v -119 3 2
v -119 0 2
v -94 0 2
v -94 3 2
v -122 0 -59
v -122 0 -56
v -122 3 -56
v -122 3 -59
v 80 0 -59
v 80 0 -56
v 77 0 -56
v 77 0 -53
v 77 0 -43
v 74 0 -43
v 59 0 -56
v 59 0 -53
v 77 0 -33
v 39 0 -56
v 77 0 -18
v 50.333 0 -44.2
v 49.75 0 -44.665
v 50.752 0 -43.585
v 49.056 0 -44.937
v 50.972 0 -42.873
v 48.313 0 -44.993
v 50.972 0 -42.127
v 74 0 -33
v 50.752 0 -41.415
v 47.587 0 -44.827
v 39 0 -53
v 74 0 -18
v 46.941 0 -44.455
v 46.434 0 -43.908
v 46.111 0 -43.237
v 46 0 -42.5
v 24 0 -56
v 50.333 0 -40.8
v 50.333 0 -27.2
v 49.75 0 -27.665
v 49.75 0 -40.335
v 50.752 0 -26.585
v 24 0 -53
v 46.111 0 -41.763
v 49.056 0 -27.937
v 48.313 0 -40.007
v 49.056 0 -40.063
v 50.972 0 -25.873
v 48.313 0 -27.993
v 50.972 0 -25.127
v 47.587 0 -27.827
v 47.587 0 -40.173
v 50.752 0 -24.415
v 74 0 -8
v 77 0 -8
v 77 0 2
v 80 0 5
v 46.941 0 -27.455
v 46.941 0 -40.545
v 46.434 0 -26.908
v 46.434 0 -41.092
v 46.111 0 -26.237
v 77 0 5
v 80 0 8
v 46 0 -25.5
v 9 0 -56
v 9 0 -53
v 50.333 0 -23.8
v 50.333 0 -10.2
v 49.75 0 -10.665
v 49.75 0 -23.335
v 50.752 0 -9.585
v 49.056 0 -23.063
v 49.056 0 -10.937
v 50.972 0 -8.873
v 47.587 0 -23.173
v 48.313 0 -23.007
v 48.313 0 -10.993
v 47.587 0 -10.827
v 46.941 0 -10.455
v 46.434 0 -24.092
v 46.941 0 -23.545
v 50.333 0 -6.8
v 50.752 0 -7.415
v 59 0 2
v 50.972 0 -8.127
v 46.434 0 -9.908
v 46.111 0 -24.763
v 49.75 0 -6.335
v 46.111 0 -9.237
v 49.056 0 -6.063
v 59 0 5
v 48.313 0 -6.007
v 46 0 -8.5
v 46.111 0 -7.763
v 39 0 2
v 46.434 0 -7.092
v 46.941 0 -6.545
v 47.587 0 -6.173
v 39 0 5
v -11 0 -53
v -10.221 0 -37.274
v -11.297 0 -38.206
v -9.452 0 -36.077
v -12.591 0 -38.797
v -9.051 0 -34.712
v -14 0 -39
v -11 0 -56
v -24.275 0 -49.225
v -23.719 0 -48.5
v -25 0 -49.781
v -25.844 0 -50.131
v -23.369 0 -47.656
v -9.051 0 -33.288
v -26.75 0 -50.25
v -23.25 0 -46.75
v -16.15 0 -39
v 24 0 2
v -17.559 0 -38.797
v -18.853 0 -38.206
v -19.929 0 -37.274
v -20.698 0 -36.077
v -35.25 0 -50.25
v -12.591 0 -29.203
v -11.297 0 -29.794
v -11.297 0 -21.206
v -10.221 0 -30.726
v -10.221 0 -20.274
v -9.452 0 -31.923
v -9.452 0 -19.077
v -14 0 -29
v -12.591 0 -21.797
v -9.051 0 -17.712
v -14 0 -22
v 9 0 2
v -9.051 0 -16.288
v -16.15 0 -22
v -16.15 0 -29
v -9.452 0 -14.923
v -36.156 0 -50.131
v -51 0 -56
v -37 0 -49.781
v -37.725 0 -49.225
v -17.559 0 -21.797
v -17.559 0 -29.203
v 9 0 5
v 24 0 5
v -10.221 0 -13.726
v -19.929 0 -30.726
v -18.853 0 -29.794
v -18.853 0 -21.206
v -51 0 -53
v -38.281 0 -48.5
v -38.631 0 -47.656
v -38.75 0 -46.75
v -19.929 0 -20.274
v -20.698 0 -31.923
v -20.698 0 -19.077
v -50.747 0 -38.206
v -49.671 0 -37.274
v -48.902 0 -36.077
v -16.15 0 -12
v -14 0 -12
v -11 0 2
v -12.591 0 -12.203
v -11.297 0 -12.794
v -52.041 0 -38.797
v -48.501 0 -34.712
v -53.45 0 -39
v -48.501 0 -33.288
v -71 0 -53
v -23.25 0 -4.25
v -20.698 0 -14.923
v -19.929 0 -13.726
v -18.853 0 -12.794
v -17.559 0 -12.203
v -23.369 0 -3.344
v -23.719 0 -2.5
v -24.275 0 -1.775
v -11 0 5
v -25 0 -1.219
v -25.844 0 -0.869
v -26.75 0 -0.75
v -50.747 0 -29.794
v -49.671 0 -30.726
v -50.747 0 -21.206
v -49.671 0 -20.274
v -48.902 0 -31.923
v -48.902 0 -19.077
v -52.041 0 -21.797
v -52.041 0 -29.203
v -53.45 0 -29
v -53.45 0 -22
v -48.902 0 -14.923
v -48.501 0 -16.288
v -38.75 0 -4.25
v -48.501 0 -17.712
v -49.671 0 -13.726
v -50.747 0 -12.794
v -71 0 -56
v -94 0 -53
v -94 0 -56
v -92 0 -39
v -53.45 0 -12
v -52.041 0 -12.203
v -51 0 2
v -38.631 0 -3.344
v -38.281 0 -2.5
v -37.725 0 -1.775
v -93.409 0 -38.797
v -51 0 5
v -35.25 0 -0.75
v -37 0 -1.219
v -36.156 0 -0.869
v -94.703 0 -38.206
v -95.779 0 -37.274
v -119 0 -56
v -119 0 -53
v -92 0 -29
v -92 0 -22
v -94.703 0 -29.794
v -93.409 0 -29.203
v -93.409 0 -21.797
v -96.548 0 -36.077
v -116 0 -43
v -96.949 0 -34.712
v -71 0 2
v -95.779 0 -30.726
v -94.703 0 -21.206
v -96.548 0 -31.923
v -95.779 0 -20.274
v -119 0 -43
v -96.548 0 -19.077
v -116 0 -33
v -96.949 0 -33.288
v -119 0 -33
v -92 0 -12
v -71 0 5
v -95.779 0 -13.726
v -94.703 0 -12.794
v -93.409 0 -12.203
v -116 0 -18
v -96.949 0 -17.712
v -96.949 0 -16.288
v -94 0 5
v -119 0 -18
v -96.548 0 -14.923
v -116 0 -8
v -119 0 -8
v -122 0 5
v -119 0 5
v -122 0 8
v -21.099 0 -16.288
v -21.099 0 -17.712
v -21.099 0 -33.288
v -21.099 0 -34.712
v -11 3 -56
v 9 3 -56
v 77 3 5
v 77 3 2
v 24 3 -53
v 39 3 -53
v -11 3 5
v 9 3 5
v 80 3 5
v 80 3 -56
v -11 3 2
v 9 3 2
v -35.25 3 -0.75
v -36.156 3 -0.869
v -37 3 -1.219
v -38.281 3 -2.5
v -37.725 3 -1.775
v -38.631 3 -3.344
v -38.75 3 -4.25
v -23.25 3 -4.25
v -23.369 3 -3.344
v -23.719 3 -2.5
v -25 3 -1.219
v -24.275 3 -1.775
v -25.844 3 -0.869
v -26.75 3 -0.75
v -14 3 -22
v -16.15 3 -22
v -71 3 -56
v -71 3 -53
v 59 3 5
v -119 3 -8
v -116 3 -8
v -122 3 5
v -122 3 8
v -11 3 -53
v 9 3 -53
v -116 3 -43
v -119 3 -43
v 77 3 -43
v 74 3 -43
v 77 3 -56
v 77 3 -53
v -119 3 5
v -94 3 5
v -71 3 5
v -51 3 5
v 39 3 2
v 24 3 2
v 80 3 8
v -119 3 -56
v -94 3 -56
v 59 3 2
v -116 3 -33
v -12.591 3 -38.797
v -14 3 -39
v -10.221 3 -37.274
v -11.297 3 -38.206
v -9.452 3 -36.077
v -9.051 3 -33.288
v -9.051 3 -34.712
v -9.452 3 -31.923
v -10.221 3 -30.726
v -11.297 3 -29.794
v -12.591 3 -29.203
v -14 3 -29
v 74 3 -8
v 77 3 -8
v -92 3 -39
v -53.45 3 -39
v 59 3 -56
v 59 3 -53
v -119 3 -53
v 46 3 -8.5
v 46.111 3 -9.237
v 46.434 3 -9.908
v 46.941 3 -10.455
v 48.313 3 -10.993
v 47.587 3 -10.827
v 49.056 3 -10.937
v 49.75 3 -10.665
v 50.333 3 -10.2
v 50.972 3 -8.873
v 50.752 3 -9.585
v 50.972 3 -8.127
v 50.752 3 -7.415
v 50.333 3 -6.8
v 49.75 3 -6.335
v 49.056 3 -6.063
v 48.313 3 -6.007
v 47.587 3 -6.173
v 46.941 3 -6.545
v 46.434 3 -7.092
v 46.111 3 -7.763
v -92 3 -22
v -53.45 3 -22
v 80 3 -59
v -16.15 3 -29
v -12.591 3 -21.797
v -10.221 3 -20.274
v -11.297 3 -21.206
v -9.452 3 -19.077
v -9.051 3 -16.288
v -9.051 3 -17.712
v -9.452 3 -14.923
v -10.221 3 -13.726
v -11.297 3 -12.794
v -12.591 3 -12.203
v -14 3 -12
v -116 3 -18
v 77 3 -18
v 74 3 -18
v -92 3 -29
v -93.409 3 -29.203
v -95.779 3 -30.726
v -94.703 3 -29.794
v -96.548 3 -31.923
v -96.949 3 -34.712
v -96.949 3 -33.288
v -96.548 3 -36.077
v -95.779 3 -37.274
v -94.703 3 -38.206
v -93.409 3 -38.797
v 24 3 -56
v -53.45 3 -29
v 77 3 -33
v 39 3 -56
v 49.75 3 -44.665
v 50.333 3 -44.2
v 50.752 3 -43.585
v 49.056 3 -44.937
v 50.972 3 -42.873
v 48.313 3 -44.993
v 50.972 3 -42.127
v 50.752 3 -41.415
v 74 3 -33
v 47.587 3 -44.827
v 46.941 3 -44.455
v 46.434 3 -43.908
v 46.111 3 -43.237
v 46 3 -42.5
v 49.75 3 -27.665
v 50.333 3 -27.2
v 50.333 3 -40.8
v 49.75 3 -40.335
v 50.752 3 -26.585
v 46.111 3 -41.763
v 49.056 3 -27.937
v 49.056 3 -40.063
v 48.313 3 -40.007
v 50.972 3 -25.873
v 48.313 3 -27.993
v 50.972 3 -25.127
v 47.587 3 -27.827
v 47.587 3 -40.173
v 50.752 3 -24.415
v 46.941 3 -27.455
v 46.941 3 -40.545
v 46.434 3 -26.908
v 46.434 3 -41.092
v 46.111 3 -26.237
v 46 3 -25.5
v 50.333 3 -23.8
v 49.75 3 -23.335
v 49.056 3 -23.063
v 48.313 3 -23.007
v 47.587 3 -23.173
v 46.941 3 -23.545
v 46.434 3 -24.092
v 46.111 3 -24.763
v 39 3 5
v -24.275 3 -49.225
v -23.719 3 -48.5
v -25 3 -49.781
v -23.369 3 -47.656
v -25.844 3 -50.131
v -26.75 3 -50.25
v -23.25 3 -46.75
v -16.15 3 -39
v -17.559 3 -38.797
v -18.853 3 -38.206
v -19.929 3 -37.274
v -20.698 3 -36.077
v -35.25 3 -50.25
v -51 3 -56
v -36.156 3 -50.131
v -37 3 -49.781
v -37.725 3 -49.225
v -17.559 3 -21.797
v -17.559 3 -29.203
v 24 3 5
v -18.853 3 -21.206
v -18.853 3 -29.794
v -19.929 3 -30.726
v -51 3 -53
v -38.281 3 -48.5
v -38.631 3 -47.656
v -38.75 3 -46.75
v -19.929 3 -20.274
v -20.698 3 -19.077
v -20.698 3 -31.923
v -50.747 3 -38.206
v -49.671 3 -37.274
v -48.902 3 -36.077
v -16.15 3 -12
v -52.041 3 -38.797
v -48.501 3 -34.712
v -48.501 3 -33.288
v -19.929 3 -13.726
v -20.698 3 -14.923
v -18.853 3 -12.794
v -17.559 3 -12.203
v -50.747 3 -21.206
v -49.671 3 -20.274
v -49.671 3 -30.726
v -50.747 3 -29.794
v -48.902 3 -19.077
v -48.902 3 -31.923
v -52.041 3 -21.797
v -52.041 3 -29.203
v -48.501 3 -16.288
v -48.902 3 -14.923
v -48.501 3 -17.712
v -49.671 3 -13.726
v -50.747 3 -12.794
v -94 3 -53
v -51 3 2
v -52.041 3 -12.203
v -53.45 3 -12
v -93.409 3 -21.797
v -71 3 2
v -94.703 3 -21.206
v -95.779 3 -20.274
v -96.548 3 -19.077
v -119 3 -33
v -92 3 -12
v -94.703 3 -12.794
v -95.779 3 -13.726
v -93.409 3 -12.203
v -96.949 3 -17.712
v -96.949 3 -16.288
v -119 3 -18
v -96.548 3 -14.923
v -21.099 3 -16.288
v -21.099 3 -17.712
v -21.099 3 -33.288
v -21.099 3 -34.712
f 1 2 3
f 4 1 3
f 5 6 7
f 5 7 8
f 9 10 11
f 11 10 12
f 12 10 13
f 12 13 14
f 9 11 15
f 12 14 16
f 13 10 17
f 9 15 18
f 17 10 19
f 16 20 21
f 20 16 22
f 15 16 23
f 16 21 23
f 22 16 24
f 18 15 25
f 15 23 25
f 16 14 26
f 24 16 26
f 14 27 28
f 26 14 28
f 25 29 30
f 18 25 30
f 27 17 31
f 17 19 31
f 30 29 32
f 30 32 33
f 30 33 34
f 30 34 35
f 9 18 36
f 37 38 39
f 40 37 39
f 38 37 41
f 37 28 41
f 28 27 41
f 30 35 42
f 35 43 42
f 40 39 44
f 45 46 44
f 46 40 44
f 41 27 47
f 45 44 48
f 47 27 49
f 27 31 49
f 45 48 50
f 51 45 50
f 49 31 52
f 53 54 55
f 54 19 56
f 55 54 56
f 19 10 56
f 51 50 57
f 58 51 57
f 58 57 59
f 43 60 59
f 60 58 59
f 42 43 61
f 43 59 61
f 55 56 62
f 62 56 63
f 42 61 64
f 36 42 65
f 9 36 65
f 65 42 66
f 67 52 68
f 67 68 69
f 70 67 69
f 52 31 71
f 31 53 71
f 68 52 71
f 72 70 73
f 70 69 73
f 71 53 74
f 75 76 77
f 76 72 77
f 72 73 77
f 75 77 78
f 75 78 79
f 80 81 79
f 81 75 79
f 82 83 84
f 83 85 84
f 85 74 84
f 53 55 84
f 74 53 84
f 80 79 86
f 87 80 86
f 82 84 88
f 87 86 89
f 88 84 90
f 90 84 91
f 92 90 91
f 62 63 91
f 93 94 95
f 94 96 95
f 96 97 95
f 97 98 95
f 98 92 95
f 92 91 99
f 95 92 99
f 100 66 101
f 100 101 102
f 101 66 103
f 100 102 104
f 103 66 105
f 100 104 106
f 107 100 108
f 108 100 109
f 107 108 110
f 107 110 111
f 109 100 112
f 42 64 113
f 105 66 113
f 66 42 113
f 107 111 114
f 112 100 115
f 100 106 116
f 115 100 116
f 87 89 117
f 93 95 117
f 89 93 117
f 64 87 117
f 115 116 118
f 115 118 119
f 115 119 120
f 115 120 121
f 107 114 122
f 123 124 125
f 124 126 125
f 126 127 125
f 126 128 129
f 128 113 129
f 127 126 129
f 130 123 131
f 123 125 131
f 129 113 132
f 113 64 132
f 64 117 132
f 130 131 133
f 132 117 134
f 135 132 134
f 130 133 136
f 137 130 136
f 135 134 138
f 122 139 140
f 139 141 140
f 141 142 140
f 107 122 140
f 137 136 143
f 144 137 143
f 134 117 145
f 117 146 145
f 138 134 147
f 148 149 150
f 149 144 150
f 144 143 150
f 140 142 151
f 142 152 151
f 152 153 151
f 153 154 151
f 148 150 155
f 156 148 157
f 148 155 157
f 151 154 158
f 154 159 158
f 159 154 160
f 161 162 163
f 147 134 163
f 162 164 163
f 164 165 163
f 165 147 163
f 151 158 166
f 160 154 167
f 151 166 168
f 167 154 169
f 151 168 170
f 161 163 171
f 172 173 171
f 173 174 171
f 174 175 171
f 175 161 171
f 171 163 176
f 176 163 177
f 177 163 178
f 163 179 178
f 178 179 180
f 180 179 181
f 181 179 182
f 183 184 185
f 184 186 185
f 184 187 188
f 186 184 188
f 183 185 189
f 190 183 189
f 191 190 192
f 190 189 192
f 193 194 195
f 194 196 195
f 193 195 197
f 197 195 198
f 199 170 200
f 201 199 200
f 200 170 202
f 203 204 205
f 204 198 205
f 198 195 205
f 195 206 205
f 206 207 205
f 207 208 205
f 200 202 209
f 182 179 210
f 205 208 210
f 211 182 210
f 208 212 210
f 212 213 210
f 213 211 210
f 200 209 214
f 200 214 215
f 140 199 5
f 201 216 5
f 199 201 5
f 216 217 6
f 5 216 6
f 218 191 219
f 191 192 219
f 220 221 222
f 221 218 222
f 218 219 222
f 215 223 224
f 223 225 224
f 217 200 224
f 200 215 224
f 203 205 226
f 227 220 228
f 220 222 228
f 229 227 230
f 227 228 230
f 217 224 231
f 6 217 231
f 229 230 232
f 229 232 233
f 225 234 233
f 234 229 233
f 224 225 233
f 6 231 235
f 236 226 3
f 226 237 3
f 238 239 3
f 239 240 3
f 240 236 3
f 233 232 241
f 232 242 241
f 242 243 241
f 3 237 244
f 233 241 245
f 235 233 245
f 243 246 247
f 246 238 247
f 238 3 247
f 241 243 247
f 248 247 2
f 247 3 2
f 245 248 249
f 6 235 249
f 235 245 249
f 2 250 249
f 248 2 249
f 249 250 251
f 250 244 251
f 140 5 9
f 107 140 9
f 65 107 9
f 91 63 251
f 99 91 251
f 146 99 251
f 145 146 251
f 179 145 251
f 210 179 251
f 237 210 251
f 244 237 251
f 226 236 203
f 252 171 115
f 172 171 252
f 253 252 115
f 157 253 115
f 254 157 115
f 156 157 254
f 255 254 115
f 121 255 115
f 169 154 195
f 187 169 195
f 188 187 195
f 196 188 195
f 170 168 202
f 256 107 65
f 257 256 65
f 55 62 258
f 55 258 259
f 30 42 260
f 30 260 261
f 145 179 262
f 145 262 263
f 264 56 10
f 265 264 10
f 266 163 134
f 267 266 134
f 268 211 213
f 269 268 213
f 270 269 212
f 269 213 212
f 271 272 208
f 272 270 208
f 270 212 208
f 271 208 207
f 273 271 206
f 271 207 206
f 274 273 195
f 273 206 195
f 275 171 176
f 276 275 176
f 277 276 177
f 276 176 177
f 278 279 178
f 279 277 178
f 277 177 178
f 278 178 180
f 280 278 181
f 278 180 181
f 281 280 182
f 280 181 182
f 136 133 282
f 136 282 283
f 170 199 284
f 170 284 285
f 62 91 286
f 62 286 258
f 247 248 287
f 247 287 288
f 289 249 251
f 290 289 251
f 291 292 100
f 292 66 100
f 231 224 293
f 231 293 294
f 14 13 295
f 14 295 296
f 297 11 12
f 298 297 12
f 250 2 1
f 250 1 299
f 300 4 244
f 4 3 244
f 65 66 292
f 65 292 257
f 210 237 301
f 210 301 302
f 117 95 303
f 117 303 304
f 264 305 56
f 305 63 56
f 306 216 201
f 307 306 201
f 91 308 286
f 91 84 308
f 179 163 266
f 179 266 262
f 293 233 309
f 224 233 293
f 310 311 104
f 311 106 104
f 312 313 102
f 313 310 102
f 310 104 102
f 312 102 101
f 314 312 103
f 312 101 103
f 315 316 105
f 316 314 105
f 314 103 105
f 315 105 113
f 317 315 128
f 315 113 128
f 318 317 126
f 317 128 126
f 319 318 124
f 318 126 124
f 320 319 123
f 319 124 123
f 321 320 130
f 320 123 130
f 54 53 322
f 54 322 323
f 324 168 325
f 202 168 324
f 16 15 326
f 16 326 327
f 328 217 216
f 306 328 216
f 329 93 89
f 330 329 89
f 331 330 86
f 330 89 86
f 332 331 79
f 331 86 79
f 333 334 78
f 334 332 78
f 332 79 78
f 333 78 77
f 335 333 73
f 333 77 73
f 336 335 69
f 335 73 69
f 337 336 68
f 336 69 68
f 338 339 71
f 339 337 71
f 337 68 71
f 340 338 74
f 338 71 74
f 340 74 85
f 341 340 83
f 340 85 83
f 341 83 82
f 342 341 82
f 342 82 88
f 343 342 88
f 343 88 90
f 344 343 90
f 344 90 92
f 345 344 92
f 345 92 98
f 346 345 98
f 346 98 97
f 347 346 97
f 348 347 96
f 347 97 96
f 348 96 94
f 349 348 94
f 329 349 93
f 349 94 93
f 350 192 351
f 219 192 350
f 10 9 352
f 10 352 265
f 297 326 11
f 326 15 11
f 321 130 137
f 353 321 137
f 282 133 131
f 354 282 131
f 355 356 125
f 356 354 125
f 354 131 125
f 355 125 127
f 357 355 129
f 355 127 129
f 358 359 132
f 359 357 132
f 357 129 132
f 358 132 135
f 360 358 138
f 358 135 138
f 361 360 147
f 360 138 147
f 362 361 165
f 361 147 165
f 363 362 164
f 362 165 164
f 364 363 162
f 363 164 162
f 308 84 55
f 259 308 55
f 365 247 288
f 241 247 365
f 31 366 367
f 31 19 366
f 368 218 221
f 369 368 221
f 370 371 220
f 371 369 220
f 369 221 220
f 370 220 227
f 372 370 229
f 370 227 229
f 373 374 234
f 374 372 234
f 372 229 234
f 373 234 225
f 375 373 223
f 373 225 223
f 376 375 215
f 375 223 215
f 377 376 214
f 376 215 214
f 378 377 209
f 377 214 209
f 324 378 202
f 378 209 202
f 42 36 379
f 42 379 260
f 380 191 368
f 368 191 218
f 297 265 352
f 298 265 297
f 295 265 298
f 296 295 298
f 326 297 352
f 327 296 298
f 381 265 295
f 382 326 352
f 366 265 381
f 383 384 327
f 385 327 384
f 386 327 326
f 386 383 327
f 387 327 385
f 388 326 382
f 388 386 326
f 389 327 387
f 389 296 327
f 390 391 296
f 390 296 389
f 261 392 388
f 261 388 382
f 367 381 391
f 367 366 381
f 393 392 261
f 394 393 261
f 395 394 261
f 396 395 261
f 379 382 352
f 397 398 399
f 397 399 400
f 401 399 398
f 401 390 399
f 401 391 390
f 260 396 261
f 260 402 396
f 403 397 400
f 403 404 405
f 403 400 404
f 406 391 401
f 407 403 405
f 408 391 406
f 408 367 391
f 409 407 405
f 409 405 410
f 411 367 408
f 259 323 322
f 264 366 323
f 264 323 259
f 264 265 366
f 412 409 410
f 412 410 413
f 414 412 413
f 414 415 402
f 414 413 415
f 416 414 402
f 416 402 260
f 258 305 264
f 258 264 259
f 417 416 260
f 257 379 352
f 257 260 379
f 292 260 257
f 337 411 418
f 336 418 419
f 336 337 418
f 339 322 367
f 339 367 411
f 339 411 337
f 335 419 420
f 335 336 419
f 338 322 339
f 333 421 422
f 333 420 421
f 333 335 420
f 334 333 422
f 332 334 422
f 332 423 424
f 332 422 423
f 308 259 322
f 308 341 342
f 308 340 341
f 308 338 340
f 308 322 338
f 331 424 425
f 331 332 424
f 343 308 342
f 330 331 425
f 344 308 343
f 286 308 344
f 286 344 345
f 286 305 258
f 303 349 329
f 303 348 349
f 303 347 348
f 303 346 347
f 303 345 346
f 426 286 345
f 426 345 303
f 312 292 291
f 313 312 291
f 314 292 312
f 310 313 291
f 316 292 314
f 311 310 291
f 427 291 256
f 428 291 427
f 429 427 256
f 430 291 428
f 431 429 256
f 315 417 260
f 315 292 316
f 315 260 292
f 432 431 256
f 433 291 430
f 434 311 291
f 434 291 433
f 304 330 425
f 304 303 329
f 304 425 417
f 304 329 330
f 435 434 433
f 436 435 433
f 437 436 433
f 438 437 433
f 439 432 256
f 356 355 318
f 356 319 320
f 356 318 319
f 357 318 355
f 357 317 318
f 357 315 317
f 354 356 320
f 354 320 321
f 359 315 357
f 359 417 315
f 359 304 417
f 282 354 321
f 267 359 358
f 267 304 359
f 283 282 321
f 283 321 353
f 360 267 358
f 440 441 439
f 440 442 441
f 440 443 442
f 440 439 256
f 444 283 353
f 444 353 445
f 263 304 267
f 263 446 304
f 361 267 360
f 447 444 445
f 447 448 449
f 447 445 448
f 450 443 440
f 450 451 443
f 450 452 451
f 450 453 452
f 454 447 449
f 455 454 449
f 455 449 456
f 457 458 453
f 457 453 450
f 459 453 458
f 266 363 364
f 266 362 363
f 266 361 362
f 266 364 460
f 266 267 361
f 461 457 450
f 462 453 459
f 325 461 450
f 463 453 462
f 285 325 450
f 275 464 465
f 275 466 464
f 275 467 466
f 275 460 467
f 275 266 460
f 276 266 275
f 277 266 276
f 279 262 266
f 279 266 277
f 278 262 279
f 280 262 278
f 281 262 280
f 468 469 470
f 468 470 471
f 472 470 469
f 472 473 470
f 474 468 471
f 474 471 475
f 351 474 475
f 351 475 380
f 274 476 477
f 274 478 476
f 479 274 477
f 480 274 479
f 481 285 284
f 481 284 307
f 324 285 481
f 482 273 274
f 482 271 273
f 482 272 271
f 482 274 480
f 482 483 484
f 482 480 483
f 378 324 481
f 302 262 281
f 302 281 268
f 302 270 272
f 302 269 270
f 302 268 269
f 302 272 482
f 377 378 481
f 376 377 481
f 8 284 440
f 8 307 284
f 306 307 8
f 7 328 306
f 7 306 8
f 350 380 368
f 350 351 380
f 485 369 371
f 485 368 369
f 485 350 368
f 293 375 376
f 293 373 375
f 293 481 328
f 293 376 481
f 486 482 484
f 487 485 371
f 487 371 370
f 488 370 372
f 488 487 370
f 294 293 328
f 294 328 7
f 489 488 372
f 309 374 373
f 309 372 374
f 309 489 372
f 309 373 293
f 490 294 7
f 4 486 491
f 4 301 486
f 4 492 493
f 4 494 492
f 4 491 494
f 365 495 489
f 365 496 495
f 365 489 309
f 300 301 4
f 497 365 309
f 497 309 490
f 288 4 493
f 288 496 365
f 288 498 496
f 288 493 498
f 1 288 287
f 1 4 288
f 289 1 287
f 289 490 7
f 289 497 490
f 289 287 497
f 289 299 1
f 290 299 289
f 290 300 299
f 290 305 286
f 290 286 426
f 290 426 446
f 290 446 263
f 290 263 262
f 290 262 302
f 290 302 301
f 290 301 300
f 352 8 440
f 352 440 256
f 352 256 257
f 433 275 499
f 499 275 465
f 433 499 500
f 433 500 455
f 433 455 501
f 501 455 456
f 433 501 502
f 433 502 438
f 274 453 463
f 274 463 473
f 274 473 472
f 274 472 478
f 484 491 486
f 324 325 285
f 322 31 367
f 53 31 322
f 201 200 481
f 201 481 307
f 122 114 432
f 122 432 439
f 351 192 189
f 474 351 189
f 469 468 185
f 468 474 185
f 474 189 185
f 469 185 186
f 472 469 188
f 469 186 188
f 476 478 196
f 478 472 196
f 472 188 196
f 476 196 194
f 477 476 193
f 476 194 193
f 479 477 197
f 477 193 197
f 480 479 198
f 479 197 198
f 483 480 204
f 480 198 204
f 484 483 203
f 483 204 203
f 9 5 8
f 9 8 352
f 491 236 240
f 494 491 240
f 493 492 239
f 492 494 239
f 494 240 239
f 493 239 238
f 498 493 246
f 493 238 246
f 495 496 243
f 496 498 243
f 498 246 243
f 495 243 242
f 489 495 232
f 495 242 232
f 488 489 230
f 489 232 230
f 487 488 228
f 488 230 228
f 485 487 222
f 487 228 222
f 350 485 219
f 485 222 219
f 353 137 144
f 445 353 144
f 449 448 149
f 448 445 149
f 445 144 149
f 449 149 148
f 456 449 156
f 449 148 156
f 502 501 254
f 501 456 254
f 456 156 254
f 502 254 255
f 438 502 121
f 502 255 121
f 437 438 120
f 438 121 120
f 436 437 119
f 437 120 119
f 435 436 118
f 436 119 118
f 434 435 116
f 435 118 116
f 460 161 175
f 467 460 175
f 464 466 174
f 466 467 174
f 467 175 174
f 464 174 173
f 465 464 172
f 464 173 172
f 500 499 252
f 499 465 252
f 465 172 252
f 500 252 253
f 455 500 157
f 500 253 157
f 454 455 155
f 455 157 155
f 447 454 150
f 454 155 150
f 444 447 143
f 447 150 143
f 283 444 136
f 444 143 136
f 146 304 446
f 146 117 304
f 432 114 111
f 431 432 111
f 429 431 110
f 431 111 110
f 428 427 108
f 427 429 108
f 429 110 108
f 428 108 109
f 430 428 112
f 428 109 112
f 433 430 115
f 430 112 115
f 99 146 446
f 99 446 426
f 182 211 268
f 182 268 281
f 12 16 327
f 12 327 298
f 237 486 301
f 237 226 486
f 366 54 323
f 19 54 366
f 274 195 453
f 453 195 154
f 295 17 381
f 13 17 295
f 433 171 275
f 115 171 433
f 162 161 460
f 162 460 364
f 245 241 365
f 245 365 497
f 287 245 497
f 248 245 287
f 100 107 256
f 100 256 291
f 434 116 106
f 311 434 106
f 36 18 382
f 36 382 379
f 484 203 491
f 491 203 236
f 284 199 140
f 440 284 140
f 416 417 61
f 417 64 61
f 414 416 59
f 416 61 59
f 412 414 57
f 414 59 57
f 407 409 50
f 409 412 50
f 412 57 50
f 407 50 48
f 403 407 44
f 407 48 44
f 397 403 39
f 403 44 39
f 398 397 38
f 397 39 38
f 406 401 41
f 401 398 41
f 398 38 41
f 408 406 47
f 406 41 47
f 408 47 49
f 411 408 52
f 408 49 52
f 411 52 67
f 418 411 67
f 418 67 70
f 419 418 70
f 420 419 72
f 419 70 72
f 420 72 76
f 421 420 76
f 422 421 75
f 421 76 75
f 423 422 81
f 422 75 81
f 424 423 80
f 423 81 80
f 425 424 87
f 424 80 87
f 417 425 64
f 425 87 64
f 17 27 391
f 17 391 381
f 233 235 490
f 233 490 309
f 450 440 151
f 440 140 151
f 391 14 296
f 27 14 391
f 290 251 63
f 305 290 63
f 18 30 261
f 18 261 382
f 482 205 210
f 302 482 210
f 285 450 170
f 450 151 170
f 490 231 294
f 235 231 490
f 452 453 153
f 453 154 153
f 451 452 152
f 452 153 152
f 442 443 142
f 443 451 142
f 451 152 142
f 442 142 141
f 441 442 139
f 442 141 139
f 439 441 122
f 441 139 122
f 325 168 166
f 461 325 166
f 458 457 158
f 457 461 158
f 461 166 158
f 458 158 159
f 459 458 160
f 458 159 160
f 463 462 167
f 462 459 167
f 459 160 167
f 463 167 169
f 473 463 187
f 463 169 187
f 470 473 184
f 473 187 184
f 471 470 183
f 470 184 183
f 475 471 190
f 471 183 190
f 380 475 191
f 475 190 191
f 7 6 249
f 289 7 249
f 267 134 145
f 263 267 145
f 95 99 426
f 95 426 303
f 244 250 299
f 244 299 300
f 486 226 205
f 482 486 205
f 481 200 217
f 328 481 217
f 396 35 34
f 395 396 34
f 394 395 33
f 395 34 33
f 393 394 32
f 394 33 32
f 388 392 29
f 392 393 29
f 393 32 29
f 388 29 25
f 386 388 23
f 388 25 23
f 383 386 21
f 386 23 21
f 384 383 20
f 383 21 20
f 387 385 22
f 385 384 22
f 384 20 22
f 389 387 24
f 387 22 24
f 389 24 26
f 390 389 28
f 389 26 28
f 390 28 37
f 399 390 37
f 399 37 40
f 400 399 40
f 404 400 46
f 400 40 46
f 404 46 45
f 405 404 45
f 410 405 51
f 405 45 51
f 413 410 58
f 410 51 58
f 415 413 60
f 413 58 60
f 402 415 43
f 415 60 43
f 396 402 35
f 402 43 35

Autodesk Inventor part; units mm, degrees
ref_plane "YZ Plane" through (0, 0, 0) normal (1, 0, 0) x (0, 1, 0)
ref_plane "XZ Plane" through (0, 0, 0) normal (0, 1, 0) x (-1, 0, 0)
ref_plane "XY Plane" through (0, 0, 0) normal (0, 0, 1) x (1, 0, 0)
sketch "Sketch1" plane through (0, 0, 0) normal (0, 1, 0) x (-1, 0, 0)
  line L0 (37.25, -2.25) -> (24.75, -2.25) construction
  line L1 (24.75, -2.25) -> (24.75, -14.75) construction
  line L2 (24.75, -14.75) -> (37.25, -14.75) construction
  line L3 (37.25, -14.75) -> (37.25, -2.25) construction
  line L4 (56.9183, -8.5) -> (8.3915, -8.5) construction
  line L5 (0, -17) -> (105, -17) construction
  line L6 (0, 0) -> (0, -51) construction
  line L7 (0, -34) -> (105, -34) construction
  line L8 (105, -51) -> (105, 0) construction
  line L9 (31, 19) -> (31, -51) construction
  line L10 (56.8064, -25.5) -> (17, -25.5) construction
  line L11 (24.75, -19.25) -> (24.75, -31.75) construction
  line L12 (37.25, -19.25) -> (24.75, -19.25) construction
  line L13 (37.25, -31.75) -> (37.25, -19.25) construction
  line L14 (24.75, -31.75) -> (37.25, -31.75) construction
  line L15 (24.75, -36.25) -> (24.75, -48.75) construction
  line L16 (37.25, -36.25) -> (24.75, -36.25) construction
  line L17 (37.25, -48.75) -> (37.25, -36.25) construction
  line L18 (24.75, -48.75) -> (37.25, -48.75) construction
  line L19 (56.3008, -42.5) -> (16.5498, -42.5) construction
  arc A0 (53.45, -12) -> (53.45, -22) centre (53.45, -17) ccw
  arc A1 (92, -22) -> (92, -12) centre (92, -17) ccw
  arc A2 (53.45, -29) -> (53.45, -39) centre (53.45, -34) ccw
  arc A3 (92, -39) -> (92, -29) centre (92, -34) ccw
  line L20 (53.45, -12) -> (92, -12)
  line L21 (53.45, -22) -> (92, -22)
  line L22 (53.45, -29) -> (92, -29)
  line L23 (53.45, -39) -> (92, -39)
  arc A4 (16.15, -39) -> (16.15, -29) centre (16.15, -34) ccw
  line L24 (103.5, -49.5) -> (103.5, -1.5) construction
  line L25 (1.5, -1.5) -> (1.5, -49.5) construction
  arc A5 (14, -29) -> (14, -39) centre (14, -34) ccw
  arc A6 (14, -12) -> (14, -22) centre (14, -17) ccw
  line L26 (16.15, -39) -> (14, -39)
  line L27 (14, -29) -> (16.15, -29)
  line L28 (14, -22) -> (16.15, -22)
  line L29 (16.15, -12) -> (14, -12)
  arc A7 (16.15, -22) -> (16.15, -12) centre (16.15, -17) ccw
  arc A8 (96.5, -51) -> (93, -47.5) centre (93, -51) ccw construction
  arc A9 (53.45, -47.5) -> (49.95, -51) centre (53.45, -51) ccw construction
  arc A10 (97.7697, -49.5) -> (93, -46) centre (93, -51) ccw construction
  line L30 (93, -46) -> (53.45, -46) construction
  line L31 (96.5, -51) -> (105, -51) construction
  line L32 (93, -47.5) -> (53.45, -47.5) construction
  line L33 (105, -49.5) -> (97.7697, -49.5) construction
  arc A11 (53.45, -46) -> (48.6803, -49.5) centre (53.45, -51) ccw construction
  arc A12 (48.6803, -1.5) -> (53.45, -5) centre (53.45, 0) ccw construction
  arc A13 (49.95, 0) -> (53.45, -3.5) centre (53.45, 0) ccw construction
  line L34 (93, -3.5) -> (53.45, -3.5) construction
  line L35 (93, -5) -> (53.45, -5) construction
  line L36 (97.7697, -1.5) -> (105, -1.5) construction
  line L37 (105, 0) -> (96.5, 0) construction
  arc A14 (93, -3.5) -> (96.5, 0) centre (93, 0) ccw construction
  arc A15 (93, -5) -> (97.7697, -1.5) centre (93, 0) ccw construction
  arc A16 (16.65, -51) -> (13.15, -47.5) centre (13.15, -51) ccw construction
  arc A17 (12, -47.5) -> (8.5, -51) centre (12, -51) ccw construction
  line L38 (13.15, -46) -> (12, -46) construction
  line L39 (13.15, -47.5) -> (12, -47.5) construction
  arc A18 (12, -46) -> (7.2303, -49.5) centre (12, -51) ccw construction
  arc A19 (17.9197, -49.5) -> (13.15, -46) centre (13.15, -51) ccw construction
  line L40 (48.6803, -49.5) -> (17.9197, -49.5) construction
  line L41 (7.2303, -49.5) -> (0, -49.5) construction
  line L42 (0, -51) -> (8.5, -51) construction
  line L43 (16.65, -51) -> (49.95, -51) construction
  line L44 (13.15, -5) -> (12, -5) construction
  line L45 (13.15, -3.5) -> (12, -3.5) construction
  arc A20 (8.5, 0) -> (12, -3.5) centre (12, 0) ccw construction
  arc A21 (13.15, -3.5) -> (16.65, 0) centre (13.15, 0) ccw construction
  arc A22 (7.2303, -1.5) -> (12, -5) centre (12, 0) ccw construction
  arc A23 (13.15, -5) -> (17.9197, -1.5) centre (13.15, 0) ccw construction
  line L46 (49.95, 0) -> (16.65, 0) construction
  line L47 (8.5, 0) -> (0, 0) construction
  line L48 (0, -1.5) -> (7.2303, -1.5) construction
  line L49 (17.9197, -1.5) -> (48.6803, -1.5) construction
  arc A24 (38.75, -4.25) -> (35.25, -0.75) centre (35.25, -4.25) ccw
  arc A25 (26.75, -0.75) -> (23.25, -4.25) centre (26.75, -4.25) ccw
  arc A26 (35.25, -50.25) -> (38.75, -46.75) centre (35.25, -46.75) ccw
  arc A27 (23.25, -46.75) -> (26.75, -50.25) centre (26.75, -46.75) ccw
  line L50 (38.75, -4.25) -> (38.75, -46.75)
  line L51 (35.25, -0.75) -> (26.75, -0.75)
  line L52 (23.25, -4.25) -> (23.25, -46.75)
  line L53 (26.75, -50.25) -> (35.25, -50.25)
  line L54 (119, -53) -> (119, -56)
  line L55 (-77, -56) -> (-77, -53)
  line L56 (119, 2) -> (119, 5)
  line L57 (-77, 5) -> (-77, 2)
  line L58 (51, -56) -> (51, -53)
  line L59 (11, -56) -> (11, -53)
  line L60 (71, -56) -> (71, -53)
  line L61 (94, -53) -> (94, -56)
  line L62 (-9, -53) -> (-9, -56)
  line L63 (-59, -56) -> (-59, -53)
  line L64 (94, 2) -> (94, 5)
  line L65 (71, 2) -> (71, 5)
  line L66 (51, 2) -> (51, 5)
  line L67 (11, 2) -> (11, 5)
  line L68 (-9, 2) -> (-9, 5)
  line L69 (-59, 2) -> (-59, 5)
  line L70 (122, -56) -> (122, 5)
  line L71 (-80, 5) -> (-80, -56)
  line L72 (122, -56) -> (122, -59)
  line L73 (122, -59) -> (-80, -59)
  line L74 (-80, -59) -> (-80, -56)
  line L75 (122, 5) -> (122, 8)
  line L76 (122, 8) -> (-80, 8)
  line L77 (-80, 8) -> (-80, 5)
  line L78 (119, -56) -> (94, -56)
  line L79 (71, -56) -> (51, -56)
  line L80 (11, -56) -> (-9, -56)
  line L81 (-59, -56) -> (-77, -56)
  line L82 (-59, -53) -> (-77, -53)
  line L83 (-9, -53) -> (11, -53)
  line L84 (51, -53) -> (71, -53)
  line L85 (94, -53) -> (119, -53)
  line L86 (119, 5) -> (94, 5)
  line L87 (119, 2) -> (94, 2)
  line L88 (71, 2) -> (51, 2)
  line L89 (71, 5) -> (51, 5)
  line L90 (11, 2) -> (-9, 2)
  line L91 (11, 5) -> (-9, 5)
  line L92 (-59, 2) -> (-77, 2)
  line L93 (-59, 5) -> (-77, 5)
  line L94 (-24, -53) -> (-39, -53)
  line L95 (-39, -53) -> (-39, -56)
  line L96 (-39, -56) -> (-24, -56)
  line L97 (-24, -56) -> (-24, -53)
  line L98 (-24, 5) -> (-39, 5)
  line L99 (-39, 5) -> (-39, 2)
  line L100 (-39, 2) -> (-24, 2)
  line L101 (-24, 2) -> (-24, 5)
  line L102 (-74, -8) -> (-77, -8)
  line L103 (-77, -8) -> (-77, -18)
  line L104 (-77, -18) -> (-74, -18)
  line L105 (-74, -18) -> (-74, -8)
  line L106 (-74, -33) -> (-77, -33)
  line L107 (-77, -33) -> (-77, -43)
  line L108 (-77, -43) -> (-74, -43)
  line L109 (-74, -43) -> (-74, -33)
  line L110 (119, -8) -> (116, -8)
  line L111 (116, -8) -> (116, -18)
  line L112 (116, -18) -> (119, -18)
  line L113 (119, -18) -> (119, -8)
  line L114 (119, -33) -> (116, -33)
  line L115 (116, -33) -> (116, -43)
  line L116 (116, -43) -> (119, -43)
  line L117 (119, -43) -> (119, -33)
  line L118 (-74, 2) -> (-67, 2) construction
  line L119 (-74, -18) -> (-76.75, -18) construction
  line L120 (-76.75, -33) -> (-74, -33) construction
  circle A28 centre (-48.5, -42.5) radius 2.5
  circle A29 centre (-48.5, -25.5) radius 2.5
  circle A30 centre (-48.5, -8.5) radius 2.5
  point P0 (31, -8.5)
  point P1 (31, -42.5)
  point P2 (31, -25.5)
  point P3 (-74, -53)
  point P4 (-74, -53)
  point P5 (-74, -53)
  point P6 (-74, -53)
  dimension "d0" = 12.5
  dimension "d1" = 12.5
  dimension "d2" = 17
  dimension "d3" = 31
  dimension "d4" = 105
  dimension "d5" = 17
  dimension "d6" = 17
  dimension "d7" = 10
  dimension "d8" = 1.5
  dimension "d9" = 1.5
  dimension "d10" = 5
  dimension "d11" = 1.5
  dimension "d12" = 1.5
  dimension "d13" = 1.5
  dimension "d14" = 17
  dimension "d15" = 17
  dimension "d16" = 12
  dimension "d17" = 13
  dimension "d19" = 11.6
  dimension "d20" = 8.6
  dimension "d21" = 12
  dimension "d28" = 2
  dimension "d29" = 2
  dimension "d30" = 7
  dimension "d31" = 2
  dimension "d32" = 2
  dimension "d38" = 40
  dimension "d39" = 20
  dimension "d40" = 23
  dimension "d42" = 20
  dimension "d46" = 202
  dimension "d55" = 3
  dimension "d56" = 3
  dimension "d60" = 18
  dimension "d61" = 15
  dimension "d62" = 15
  dimension "d63" = 20
  dimension "d64" = 14
  dimension "d65" = 22.45
  dimension "d66" = 10.5
  dimension "d67" = 2
  dimension "d73" = 25
  dimension "d74" = 3
  dimension "d78" = 3
  dimension "d79" = 3
  dimension "d80" = 15
  dimension "d81" = 10
  dimension "d92" = 2.75
  dimension "d100" = 17
  dimension "d105" = 20
  dimension "d107" = 15
  dimension "d109" = 5
  dimension "d110" = 31.5
  dimension "d111" = 16.5
  dimension "d112" = 17
extrude "Extrusion2" add sketch "Sketch1" along normal blind 3
properties part number "Top_plate2"
